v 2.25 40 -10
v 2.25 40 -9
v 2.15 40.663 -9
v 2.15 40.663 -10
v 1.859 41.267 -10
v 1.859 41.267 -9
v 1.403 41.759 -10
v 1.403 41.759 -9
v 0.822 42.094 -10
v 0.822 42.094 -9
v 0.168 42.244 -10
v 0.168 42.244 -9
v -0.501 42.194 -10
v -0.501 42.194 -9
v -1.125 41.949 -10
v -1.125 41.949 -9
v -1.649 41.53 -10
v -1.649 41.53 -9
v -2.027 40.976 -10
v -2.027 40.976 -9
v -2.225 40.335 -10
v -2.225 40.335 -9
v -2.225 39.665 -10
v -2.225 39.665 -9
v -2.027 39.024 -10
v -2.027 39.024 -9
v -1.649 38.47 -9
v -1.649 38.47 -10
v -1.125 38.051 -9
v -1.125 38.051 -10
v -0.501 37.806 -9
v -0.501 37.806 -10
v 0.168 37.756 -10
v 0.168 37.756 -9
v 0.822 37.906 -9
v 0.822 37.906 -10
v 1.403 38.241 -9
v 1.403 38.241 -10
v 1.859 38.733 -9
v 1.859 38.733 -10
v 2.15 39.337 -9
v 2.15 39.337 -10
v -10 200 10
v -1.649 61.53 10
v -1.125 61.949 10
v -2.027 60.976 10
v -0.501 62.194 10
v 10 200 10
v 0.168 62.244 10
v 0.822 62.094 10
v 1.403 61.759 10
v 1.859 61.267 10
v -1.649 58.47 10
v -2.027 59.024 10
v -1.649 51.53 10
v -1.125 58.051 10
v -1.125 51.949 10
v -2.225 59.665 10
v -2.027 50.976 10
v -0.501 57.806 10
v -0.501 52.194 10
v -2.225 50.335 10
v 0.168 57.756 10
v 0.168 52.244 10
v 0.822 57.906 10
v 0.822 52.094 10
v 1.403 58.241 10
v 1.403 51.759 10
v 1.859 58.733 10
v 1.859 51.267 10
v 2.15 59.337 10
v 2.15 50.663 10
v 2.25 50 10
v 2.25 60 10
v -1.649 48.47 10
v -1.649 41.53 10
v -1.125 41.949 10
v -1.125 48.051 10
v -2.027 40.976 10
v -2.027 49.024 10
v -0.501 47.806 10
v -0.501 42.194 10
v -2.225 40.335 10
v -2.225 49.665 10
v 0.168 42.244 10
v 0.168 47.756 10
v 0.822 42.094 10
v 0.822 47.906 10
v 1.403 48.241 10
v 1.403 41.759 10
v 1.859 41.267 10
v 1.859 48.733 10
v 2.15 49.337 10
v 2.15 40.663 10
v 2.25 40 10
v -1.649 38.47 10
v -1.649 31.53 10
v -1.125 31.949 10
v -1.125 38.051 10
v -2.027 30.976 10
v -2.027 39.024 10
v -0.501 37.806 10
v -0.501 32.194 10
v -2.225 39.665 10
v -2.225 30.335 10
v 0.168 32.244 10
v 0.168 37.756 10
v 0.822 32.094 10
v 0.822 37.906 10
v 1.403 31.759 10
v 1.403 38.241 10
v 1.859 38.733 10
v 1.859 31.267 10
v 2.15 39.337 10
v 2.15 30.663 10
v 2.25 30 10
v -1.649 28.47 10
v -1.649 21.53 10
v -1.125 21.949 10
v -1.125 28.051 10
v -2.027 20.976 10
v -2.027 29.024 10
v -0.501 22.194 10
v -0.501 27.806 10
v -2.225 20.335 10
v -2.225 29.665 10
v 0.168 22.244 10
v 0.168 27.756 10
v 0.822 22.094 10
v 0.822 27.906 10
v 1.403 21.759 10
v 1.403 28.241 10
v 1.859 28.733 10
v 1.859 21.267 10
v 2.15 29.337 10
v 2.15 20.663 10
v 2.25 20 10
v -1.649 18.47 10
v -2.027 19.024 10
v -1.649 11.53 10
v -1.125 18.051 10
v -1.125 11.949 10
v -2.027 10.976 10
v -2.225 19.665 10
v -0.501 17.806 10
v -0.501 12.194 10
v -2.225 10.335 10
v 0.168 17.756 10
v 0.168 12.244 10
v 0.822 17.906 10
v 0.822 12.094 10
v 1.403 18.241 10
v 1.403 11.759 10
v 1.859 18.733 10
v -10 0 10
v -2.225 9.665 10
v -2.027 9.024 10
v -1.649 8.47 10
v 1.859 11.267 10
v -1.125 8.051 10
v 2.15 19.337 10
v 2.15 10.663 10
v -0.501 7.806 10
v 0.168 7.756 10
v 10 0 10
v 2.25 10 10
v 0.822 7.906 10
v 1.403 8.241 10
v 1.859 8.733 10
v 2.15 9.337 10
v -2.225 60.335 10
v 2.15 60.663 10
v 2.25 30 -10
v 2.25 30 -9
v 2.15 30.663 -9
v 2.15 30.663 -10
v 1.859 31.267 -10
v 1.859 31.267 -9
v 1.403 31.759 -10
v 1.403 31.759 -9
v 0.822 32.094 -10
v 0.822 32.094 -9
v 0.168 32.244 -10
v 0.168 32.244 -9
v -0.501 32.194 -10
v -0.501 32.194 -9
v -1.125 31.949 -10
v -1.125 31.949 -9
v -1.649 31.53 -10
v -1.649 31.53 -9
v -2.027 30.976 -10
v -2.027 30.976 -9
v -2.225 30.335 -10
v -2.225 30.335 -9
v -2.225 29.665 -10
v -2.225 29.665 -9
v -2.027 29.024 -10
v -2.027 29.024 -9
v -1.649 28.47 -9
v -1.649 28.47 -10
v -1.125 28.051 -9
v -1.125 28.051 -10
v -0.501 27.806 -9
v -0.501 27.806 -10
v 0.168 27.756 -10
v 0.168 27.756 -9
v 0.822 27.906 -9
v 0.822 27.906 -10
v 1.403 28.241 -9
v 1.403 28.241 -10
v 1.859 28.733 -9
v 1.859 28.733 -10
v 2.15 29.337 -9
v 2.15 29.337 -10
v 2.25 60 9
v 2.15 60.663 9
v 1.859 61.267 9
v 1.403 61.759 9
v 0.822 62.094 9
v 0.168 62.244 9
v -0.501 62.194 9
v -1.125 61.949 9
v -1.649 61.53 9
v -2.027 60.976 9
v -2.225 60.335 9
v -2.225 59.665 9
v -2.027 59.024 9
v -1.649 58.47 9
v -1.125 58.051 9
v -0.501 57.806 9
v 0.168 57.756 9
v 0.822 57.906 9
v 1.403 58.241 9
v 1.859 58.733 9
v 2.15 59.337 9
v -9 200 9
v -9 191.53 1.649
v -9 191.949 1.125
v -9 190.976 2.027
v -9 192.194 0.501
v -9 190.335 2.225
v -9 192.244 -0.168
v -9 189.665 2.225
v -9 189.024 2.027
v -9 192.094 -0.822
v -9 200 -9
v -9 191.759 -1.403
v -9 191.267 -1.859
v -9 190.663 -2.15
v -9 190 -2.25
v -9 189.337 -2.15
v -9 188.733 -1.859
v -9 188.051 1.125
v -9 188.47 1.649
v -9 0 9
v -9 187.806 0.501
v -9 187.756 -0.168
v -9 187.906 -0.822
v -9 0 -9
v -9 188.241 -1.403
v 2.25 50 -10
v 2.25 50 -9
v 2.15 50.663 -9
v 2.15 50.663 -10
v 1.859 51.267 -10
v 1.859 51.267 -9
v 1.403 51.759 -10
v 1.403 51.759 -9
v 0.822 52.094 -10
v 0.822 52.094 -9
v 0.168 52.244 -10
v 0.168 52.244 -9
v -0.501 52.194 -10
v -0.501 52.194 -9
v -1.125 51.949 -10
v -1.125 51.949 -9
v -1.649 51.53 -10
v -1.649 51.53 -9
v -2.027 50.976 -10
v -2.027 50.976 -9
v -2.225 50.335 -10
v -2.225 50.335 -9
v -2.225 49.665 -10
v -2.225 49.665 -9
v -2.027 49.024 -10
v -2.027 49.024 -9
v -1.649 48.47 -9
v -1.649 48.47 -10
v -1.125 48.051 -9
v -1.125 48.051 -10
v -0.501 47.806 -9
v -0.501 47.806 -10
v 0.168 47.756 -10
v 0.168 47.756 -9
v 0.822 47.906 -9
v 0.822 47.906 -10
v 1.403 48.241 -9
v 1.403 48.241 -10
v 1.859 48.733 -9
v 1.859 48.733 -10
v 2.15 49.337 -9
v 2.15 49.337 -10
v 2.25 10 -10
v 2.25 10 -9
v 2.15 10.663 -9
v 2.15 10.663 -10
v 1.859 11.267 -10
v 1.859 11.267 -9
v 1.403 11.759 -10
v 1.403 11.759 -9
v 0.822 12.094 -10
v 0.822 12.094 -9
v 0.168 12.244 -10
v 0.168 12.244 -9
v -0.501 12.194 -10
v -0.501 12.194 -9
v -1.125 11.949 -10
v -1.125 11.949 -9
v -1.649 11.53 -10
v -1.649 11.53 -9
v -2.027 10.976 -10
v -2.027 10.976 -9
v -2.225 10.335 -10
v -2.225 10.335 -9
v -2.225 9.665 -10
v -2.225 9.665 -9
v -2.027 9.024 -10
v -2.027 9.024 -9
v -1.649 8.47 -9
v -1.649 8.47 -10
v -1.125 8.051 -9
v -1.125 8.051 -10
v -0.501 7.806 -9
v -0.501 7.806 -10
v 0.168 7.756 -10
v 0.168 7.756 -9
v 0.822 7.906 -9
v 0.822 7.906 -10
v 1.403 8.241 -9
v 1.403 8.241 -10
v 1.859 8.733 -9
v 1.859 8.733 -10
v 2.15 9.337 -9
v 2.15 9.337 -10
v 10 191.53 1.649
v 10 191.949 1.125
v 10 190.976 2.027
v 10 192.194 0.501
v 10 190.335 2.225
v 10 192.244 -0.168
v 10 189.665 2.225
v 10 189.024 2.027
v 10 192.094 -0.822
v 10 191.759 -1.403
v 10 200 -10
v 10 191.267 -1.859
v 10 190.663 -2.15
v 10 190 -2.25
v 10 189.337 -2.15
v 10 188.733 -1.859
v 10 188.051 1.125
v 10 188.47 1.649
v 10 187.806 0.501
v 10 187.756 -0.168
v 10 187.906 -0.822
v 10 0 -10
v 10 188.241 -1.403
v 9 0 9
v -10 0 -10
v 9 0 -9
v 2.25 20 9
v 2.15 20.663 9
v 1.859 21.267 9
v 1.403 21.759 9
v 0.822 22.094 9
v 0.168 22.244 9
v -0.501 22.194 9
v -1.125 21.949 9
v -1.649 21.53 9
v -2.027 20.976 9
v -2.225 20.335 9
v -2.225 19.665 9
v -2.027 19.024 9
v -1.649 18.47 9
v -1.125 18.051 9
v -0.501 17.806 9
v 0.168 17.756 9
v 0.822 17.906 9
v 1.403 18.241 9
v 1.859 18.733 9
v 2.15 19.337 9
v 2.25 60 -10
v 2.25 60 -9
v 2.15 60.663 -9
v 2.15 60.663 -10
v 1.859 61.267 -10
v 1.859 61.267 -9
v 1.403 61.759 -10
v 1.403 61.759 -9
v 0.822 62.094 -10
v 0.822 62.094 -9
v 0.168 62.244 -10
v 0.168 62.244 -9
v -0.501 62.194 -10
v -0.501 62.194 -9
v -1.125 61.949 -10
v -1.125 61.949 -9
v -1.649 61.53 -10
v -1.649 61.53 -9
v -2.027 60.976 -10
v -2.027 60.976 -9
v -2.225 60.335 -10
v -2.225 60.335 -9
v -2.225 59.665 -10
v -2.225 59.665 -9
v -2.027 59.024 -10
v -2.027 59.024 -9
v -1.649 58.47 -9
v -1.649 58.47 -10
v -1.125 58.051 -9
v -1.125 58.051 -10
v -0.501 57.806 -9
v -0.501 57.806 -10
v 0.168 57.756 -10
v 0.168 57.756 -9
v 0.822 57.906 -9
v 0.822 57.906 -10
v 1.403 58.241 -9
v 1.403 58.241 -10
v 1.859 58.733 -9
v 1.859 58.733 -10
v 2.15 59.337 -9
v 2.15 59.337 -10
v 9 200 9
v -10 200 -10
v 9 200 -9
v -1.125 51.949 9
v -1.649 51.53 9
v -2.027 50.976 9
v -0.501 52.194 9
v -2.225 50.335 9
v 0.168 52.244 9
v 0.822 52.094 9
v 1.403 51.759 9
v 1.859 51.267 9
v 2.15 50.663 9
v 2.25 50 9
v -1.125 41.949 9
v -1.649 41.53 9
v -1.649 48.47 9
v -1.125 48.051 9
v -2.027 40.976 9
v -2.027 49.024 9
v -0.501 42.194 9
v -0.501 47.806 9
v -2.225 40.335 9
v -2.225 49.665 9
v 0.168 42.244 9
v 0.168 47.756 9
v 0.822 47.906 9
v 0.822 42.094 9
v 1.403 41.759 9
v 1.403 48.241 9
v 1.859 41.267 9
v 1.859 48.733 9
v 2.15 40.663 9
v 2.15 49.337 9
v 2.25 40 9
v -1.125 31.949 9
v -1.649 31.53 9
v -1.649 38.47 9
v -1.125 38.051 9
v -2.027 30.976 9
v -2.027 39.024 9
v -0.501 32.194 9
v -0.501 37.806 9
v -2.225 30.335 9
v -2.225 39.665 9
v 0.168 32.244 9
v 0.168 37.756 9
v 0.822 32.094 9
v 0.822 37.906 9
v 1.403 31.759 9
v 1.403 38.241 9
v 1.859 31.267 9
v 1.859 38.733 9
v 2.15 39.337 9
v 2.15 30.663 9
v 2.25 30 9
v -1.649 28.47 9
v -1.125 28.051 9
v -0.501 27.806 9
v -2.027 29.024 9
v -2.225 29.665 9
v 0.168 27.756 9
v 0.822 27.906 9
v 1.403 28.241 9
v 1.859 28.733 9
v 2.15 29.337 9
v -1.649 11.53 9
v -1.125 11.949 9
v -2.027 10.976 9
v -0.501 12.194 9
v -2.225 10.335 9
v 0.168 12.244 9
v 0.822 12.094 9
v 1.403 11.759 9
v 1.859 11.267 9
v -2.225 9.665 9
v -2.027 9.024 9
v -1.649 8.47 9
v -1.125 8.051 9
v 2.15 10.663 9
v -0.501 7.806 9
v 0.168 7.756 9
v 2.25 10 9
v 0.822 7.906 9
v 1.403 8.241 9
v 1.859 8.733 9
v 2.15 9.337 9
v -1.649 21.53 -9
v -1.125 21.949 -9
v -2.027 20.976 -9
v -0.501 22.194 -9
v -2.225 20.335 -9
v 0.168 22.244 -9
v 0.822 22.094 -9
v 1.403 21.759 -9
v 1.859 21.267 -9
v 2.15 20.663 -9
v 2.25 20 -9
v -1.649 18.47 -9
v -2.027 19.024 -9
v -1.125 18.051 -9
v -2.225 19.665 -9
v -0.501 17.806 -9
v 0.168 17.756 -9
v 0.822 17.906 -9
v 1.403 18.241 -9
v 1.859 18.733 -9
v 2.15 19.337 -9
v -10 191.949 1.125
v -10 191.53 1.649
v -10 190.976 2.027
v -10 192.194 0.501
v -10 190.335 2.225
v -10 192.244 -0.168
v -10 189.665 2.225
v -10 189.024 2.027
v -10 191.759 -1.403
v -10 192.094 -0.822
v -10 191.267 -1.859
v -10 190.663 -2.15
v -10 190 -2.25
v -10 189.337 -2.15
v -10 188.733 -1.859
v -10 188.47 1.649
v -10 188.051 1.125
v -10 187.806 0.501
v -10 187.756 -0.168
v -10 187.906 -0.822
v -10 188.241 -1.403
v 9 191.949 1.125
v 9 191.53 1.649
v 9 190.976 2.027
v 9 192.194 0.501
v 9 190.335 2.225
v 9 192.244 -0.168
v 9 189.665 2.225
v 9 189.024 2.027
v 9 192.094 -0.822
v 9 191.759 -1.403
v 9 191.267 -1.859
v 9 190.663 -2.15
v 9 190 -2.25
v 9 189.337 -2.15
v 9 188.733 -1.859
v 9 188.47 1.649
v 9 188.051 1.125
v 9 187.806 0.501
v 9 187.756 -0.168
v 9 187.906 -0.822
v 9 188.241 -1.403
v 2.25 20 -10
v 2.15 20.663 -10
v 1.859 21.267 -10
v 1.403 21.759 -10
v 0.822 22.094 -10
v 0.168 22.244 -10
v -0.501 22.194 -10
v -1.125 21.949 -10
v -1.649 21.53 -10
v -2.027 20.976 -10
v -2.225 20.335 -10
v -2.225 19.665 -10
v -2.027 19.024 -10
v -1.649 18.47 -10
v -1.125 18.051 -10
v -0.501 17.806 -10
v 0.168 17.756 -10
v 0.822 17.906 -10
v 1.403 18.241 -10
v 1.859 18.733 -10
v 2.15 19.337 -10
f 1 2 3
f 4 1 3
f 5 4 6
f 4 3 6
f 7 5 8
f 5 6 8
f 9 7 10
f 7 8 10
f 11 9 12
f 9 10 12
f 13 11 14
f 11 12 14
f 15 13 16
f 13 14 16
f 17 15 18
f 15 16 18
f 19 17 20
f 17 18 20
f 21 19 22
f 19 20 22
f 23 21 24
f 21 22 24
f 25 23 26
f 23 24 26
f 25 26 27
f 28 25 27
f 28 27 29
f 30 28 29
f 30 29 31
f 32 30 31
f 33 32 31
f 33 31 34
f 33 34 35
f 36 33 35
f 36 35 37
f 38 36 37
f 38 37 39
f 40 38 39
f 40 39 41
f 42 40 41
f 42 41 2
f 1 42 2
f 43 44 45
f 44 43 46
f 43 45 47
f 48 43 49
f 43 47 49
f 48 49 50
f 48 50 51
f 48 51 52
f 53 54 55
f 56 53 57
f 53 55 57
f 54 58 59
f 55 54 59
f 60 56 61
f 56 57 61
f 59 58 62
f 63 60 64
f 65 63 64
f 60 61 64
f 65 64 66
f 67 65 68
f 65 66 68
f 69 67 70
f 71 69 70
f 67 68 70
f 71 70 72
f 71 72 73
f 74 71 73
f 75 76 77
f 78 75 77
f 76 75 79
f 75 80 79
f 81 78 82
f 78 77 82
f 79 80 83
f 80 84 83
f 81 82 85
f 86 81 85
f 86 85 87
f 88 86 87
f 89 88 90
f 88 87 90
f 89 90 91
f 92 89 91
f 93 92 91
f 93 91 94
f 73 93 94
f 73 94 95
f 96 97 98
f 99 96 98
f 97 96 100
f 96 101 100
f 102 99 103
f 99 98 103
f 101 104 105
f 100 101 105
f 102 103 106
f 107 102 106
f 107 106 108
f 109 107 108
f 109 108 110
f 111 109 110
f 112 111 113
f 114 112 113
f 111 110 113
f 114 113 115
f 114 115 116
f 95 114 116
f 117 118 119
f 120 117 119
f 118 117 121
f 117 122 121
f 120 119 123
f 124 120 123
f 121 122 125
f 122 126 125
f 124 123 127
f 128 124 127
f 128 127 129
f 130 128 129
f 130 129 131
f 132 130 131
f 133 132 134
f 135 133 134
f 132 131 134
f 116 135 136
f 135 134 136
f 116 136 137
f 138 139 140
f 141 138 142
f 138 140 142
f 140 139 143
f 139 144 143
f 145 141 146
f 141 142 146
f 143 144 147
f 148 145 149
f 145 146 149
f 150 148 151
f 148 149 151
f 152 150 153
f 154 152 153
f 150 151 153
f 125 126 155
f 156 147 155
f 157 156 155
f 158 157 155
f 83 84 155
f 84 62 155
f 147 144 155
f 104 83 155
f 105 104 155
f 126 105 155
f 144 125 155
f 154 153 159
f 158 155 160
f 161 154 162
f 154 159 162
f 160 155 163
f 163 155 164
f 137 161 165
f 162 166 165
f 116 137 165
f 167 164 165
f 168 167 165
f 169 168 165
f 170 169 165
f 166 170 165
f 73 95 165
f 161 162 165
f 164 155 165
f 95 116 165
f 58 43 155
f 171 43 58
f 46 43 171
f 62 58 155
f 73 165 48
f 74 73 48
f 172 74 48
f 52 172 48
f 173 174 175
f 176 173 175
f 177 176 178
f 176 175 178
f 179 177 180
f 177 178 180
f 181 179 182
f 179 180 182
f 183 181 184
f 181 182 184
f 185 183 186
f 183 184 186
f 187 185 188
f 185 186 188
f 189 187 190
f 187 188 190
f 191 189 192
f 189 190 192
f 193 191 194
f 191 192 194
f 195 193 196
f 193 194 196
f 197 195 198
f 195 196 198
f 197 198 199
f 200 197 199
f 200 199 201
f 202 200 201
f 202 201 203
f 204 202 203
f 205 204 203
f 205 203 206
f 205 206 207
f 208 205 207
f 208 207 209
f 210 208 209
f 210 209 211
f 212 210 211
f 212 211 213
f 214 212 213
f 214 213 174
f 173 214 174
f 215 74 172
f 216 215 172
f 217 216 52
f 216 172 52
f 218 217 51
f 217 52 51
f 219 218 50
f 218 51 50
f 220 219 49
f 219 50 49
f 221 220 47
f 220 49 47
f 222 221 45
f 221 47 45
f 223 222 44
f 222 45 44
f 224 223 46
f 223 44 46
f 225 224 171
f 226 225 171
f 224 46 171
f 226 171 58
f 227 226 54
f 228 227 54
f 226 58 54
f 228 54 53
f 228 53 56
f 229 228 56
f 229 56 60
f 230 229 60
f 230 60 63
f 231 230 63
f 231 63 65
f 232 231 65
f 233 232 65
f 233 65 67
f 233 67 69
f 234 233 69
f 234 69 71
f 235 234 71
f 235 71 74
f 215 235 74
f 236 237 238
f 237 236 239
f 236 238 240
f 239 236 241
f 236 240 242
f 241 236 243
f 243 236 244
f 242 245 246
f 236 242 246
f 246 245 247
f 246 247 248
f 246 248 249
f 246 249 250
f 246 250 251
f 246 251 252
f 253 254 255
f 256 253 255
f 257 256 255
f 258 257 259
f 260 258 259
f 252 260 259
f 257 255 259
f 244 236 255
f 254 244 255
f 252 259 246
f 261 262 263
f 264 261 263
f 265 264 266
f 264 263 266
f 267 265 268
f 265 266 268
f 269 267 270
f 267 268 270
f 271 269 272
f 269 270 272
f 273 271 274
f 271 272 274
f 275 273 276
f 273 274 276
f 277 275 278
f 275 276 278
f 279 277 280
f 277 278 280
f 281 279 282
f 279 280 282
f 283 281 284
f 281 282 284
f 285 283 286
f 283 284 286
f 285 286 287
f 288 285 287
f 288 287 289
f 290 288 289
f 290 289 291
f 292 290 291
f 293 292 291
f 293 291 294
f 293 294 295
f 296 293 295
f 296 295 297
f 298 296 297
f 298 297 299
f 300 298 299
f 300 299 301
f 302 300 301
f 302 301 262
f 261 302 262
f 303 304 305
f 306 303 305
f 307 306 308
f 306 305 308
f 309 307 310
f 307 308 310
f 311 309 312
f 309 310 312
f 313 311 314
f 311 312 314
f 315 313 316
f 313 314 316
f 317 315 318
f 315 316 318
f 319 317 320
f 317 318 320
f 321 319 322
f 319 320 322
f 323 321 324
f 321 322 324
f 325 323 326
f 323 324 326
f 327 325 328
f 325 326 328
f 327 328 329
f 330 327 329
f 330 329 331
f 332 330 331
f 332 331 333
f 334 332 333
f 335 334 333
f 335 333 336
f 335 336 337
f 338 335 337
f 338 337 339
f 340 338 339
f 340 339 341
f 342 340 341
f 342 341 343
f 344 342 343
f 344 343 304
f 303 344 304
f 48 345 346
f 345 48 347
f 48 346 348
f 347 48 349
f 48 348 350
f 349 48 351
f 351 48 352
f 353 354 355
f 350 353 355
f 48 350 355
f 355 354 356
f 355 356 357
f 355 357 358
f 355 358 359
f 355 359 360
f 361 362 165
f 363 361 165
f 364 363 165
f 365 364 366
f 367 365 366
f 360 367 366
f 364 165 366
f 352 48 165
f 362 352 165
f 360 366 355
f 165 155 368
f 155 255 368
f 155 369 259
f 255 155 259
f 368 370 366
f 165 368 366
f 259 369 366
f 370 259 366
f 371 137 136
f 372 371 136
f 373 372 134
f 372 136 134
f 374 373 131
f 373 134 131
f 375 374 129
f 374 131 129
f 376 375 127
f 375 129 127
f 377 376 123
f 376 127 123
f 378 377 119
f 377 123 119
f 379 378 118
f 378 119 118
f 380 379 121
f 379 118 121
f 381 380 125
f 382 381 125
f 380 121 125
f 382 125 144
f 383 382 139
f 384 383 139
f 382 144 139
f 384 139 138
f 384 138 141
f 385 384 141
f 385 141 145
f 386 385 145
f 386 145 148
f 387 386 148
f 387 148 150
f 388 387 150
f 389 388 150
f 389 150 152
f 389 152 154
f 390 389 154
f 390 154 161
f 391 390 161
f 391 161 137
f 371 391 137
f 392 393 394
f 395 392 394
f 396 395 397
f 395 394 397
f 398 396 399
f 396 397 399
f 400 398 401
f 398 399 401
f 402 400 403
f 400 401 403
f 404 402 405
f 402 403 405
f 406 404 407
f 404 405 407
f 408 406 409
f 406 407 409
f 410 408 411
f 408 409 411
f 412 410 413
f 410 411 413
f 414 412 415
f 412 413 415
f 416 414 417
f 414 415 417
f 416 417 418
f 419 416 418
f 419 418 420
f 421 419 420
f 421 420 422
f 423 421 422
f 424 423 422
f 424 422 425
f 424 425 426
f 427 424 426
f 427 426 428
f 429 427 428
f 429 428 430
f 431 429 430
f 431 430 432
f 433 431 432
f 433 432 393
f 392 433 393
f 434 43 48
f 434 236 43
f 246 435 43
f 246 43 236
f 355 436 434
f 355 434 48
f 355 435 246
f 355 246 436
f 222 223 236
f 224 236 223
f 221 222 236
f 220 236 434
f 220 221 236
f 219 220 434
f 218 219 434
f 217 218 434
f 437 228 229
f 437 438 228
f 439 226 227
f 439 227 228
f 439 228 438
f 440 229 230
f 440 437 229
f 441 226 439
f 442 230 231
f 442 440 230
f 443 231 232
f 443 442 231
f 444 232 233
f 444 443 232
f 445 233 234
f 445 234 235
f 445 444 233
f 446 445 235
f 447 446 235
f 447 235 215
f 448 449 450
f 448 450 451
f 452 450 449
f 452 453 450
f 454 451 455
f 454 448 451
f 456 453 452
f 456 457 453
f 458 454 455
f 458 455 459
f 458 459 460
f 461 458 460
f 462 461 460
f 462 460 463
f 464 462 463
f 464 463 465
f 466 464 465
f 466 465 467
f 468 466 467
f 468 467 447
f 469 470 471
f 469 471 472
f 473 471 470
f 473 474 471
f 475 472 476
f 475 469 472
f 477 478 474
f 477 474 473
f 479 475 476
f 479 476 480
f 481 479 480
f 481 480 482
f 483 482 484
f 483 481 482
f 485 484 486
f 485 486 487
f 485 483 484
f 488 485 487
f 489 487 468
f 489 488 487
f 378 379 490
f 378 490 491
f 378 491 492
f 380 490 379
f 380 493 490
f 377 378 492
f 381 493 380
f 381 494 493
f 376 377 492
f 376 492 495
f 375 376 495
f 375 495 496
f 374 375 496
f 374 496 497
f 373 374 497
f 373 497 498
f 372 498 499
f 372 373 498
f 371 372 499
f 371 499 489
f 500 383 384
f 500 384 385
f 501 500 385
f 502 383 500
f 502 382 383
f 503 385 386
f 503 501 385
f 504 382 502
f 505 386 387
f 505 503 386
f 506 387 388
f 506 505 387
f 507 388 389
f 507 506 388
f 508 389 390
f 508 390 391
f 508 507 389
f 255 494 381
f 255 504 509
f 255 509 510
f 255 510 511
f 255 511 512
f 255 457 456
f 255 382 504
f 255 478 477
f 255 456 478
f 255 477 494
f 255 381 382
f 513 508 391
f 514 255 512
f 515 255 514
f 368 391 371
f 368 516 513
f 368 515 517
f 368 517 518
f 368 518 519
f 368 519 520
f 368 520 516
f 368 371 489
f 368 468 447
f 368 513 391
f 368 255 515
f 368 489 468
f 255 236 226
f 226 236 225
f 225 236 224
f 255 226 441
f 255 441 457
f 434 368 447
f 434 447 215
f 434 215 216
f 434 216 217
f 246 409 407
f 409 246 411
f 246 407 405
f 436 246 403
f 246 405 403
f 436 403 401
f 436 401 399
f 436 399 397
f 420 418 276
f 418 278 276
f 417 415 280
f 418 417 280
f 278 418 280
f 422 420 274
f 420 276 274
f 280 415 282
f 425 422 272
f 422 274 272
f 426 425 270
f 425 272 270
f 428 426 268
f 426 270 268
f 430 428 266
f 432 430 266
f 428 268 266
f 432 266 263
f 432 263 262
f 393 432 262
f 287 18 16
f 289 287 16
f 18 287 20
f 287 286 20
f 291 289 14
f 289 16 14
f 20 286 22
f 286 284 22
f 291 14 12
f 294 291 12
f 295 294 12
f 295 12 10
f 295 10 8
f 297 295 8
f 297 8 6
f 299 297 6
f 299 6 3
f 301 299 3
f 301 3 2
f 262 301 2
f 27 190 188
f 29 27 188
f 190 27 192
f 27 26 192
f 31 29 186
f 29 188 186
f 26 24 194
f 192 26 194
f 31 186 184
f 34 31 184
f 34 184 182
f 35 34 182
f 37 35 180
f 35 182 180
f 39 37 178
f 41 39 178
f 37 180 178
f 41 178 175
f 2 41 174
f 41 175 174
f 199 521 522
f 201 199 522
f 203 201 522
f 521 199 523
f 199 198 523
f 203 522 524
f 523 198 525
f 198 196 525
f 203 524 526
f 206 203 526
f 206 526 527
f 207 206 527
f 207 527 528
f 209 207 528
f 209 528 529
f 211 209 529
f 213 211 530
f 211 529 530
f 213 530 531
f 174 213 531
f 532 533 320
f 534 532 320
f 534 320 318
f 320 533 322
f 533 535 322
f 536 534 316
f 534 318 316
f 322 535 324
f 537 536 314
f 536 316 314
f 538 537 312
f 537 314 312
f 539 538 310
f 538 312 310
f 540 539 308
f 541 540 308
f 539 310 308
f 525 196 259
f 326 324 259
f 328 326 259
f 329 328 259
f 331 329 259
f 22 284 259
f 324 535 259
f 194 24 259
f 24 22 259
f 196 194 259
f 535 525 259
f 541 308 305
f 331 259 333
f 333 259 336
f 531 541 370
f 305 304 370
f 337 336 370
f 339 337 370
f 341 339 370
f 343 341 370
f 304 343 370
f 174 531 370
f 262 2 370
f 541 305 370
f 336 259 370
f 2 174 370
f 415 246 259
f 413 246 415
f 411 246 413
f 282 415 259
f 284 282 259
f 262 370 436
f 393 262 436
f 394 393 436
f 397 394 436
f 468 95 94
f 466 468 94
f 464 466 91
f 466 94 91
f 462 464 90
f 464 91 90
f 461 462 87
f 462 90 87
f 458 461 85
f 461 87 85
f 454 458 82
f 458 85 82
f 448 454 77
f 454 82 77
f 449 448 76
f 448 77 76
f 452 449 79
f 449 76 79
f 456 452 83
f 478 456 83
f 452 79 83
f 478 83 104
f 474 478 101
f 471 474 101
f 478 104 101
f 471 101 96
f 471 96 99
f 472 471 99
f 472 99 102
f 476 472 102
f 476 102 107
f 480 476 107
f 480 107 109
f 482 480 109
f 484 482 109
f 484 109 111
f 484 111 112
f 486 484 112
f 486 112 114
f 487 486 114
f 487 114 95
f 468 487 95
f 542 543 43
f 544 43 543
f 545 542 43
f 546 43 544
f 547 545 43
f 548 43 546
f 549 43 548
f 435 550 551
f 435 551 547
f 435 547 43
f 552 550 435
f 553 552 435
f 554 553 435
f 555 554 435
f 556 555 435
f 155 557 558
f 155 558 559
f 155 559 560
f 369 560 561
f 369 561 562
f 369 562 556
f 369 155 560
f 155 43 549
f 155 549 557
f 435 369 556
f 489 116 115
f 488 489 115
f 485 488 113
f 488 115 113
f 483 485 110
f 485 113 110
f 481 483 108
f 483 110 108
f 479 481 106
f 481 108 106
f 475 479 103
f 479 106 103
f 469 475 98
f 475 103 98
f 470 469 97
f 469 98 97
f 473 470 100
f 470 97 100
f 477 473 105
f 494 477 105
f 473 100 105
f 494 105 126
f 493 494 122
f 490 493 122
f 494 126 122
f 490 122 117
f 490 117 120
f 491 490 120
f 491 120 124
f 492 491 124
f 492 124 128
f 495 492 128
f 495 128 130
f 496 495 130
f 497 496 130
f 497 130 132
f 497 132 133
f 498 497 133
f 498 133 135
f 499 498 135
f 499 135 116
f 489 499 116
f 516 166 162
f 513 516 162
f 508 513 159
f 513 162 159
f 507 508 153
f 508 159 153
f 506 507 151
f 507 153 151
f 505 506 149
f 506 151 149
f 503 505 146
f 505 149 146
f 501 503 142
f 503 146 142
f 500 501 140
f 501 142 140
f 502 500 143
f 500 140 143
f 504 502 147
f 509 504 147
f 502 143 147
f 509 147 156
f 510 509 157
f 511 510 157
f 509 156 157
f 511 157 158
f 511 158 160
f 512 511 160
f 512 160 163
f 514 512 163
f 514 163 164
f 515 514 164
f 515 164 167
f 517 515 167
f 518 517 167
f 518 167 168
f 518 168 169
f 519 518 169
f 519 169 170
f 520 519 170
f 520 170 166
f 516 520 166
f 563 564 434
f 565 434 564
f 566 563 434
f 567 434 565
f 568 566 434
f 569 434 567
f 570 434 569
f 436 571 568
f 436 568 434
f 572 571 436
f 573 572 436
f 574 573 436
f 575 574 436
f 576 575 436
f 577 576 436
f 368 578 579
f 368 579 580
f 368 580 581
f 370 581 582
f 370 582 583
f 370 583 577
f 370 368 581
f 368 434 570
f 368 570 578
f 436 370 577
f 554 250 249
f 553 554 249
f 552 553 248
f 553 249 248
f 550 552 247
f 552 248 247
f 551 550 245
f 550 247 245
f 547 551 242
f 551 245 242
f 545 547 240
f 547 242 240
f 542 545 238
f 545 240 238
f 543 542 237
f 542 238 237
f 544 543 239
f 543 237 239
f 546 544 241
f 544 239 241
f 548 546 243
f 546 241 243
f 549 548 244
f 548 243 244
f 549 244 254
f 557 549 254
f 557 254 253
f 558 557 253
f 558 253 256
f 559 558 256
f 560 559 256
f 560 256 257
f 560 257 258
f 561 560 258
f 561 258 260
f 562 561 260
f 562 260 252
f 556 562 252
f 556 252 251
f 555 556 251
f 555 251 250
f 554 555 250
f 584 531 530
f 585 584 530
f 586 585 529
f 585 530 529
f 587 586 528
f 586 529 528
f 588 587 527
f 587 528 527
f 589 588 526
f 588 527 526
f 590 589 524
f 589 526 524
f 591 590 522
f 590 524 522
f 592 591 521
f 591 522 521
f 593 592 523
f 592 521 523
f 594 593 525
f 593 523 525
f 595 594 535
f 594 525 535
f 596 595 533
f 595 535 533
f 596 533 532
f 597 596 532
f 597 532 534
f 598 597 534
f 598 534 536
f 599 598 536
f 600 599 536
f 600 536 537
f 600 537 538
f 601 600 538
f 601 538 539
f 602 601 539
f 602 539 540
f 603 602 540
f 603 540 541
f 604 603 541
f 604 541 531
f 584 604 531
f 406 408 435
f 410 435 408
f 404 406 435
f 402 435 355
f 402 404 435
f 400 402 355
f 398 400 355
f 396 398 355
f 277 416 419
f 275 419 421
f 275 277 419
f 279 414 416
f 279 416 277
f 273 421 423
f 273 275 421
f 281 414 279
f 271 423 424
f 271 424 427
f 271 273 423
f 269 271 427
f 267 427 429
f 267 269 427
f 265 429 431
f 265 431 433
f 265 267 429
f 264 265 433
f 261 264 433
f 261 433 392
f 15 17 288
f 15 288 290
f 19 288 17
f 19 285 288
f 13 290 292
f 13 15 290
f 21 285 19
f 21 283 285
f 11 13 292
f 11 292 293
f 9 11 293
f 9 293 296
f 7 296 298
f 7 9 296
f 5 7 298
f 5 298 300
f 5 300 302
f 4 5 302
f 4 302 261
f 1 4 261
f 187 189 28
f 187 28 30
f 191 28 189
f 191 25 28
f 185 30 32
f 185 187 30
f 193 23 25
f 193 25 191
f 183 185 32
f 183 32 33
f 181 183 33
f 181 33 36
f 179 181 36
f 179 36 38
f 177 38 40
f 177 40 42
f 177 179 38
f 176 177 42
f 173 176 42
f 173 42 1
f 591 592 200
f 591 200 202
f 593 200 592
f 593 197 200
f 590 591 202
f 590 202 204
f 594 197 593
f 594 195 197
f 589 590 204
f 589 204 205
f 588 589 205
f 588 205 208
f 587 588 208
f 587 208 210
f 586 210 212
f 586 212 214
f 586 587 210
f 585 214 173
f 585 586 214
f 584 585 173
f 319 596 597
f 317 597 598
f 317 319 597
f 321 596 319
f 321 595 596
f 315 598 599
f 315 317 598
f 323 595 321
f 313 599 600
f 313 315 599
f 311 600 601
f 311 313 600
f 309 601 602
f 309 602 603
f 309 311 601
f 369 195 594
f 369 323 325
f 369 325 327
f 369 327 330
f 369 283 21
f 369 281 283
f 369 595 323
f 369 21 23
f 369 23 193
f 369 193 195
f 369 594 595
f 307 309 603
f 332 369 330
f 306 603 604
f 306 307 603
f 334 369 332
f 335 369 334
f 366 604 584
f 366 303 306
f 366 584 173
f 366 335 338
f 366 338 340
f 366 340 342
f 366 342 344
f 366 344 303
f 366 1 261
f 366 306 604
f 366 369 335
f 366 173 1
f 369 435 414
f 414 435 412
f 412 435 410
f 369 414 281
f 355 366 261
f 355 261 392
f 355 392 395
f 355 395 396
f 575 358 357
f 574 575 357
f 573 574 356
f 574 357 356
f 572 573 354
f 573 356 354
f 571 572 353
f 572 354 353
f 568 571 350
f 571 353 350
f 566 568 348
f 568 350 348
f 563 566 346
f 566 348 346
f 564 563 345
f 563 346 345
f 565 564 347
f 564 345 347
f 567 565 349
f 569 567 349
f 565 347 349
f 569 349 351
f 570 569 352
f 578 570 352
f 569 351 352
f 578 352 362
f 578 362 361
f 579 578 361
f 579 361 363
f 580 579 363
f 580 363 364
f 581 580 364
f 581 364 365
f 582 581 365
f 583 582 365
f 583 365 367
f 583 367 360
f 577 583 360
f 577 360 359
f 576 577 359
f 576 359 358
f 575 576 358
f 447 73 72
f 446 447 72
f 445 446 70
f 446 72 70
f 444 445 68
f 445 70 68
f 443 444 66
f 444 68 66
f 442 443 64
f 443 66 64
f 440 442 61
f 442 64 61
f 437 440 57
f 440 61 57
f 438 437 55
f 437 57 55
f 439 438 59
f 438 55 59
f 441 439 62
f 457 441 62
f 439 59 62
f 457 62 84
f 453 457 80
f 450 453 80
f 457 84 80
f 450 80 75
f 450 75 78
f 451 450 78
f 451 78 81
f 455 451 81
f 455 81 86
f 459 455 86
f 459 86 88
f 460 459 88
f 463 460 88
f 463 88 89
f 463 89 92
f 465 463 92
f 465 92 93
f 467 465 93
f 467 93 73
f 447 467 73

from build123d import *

# Parameters (mm, degrees)
SKETCH1_W           = 20
SKETCH1_H           = 20
SKETCH1_W_2         = 18
SKETCH1_H_2         = 18
BOSS_EXTRUDE1_DEPTH = 200
SKETCH2_R           = 2.25
CUT_EXTRUDE1_DEPTH  = 202.246117975
SKETCH3_R           = 2.25
CUT_EXTRUDE2_DEPTH  = 202.246117975


with BuildPart() as part:
    # Sketch1 → Boss-Extrude1 (new body)
    with BuildSketch(Plane(origin=(0, 0, 0), x_dir=(1, 0, 0), z_dir=(0, 1, 0))):
        Rectangle(SKETCH1_W, SKETCH1_H)
        Rectangle(SKETCH1_W_2, SKETCH1_H_2, mode=Mode.SUBTRACT)
    extrude(amount=BOSS_EXTRUDE1_DEPTH)

    # Sketch2 → Cut-Extrude1 (cut, through all)
    with BuildSketch(Plane.XY.offset(10)):
        with Locations((0, 10)):
            Circle(SKETCH2_R)
        with Locations((0, 20)):
            Circle(SKETCH2_R)
        with Locations((0, 30)):
            Circle(SKETCH2_R)
        with Locations((0, 40)):
            Circle(SKETCH2_R)
        with Locations((0, 50)):
            Circle(SKETCH2_R)
        with Locations((0, 60)):
            Circle(SKETCH2_R)
    extrude(amount=-CUT_EXTRUDE1_DEPTH, mode=Mode.SUBTRACT)

    # Sketch3 → Cut-Extrude2 (cut, through all)
    with BuildSketch(Plane(origin=(10, 0, 0), x_dir=(0, 0, -1), z_dir=(1, 0, 0))):
        with Locations((0, 190)):
            Circle(SKETCH3_R)
    extrude(amount=-CUT_EXTRUDE2_DEPTH, mode=Mode.SUBTRACT)


solid = part.part
